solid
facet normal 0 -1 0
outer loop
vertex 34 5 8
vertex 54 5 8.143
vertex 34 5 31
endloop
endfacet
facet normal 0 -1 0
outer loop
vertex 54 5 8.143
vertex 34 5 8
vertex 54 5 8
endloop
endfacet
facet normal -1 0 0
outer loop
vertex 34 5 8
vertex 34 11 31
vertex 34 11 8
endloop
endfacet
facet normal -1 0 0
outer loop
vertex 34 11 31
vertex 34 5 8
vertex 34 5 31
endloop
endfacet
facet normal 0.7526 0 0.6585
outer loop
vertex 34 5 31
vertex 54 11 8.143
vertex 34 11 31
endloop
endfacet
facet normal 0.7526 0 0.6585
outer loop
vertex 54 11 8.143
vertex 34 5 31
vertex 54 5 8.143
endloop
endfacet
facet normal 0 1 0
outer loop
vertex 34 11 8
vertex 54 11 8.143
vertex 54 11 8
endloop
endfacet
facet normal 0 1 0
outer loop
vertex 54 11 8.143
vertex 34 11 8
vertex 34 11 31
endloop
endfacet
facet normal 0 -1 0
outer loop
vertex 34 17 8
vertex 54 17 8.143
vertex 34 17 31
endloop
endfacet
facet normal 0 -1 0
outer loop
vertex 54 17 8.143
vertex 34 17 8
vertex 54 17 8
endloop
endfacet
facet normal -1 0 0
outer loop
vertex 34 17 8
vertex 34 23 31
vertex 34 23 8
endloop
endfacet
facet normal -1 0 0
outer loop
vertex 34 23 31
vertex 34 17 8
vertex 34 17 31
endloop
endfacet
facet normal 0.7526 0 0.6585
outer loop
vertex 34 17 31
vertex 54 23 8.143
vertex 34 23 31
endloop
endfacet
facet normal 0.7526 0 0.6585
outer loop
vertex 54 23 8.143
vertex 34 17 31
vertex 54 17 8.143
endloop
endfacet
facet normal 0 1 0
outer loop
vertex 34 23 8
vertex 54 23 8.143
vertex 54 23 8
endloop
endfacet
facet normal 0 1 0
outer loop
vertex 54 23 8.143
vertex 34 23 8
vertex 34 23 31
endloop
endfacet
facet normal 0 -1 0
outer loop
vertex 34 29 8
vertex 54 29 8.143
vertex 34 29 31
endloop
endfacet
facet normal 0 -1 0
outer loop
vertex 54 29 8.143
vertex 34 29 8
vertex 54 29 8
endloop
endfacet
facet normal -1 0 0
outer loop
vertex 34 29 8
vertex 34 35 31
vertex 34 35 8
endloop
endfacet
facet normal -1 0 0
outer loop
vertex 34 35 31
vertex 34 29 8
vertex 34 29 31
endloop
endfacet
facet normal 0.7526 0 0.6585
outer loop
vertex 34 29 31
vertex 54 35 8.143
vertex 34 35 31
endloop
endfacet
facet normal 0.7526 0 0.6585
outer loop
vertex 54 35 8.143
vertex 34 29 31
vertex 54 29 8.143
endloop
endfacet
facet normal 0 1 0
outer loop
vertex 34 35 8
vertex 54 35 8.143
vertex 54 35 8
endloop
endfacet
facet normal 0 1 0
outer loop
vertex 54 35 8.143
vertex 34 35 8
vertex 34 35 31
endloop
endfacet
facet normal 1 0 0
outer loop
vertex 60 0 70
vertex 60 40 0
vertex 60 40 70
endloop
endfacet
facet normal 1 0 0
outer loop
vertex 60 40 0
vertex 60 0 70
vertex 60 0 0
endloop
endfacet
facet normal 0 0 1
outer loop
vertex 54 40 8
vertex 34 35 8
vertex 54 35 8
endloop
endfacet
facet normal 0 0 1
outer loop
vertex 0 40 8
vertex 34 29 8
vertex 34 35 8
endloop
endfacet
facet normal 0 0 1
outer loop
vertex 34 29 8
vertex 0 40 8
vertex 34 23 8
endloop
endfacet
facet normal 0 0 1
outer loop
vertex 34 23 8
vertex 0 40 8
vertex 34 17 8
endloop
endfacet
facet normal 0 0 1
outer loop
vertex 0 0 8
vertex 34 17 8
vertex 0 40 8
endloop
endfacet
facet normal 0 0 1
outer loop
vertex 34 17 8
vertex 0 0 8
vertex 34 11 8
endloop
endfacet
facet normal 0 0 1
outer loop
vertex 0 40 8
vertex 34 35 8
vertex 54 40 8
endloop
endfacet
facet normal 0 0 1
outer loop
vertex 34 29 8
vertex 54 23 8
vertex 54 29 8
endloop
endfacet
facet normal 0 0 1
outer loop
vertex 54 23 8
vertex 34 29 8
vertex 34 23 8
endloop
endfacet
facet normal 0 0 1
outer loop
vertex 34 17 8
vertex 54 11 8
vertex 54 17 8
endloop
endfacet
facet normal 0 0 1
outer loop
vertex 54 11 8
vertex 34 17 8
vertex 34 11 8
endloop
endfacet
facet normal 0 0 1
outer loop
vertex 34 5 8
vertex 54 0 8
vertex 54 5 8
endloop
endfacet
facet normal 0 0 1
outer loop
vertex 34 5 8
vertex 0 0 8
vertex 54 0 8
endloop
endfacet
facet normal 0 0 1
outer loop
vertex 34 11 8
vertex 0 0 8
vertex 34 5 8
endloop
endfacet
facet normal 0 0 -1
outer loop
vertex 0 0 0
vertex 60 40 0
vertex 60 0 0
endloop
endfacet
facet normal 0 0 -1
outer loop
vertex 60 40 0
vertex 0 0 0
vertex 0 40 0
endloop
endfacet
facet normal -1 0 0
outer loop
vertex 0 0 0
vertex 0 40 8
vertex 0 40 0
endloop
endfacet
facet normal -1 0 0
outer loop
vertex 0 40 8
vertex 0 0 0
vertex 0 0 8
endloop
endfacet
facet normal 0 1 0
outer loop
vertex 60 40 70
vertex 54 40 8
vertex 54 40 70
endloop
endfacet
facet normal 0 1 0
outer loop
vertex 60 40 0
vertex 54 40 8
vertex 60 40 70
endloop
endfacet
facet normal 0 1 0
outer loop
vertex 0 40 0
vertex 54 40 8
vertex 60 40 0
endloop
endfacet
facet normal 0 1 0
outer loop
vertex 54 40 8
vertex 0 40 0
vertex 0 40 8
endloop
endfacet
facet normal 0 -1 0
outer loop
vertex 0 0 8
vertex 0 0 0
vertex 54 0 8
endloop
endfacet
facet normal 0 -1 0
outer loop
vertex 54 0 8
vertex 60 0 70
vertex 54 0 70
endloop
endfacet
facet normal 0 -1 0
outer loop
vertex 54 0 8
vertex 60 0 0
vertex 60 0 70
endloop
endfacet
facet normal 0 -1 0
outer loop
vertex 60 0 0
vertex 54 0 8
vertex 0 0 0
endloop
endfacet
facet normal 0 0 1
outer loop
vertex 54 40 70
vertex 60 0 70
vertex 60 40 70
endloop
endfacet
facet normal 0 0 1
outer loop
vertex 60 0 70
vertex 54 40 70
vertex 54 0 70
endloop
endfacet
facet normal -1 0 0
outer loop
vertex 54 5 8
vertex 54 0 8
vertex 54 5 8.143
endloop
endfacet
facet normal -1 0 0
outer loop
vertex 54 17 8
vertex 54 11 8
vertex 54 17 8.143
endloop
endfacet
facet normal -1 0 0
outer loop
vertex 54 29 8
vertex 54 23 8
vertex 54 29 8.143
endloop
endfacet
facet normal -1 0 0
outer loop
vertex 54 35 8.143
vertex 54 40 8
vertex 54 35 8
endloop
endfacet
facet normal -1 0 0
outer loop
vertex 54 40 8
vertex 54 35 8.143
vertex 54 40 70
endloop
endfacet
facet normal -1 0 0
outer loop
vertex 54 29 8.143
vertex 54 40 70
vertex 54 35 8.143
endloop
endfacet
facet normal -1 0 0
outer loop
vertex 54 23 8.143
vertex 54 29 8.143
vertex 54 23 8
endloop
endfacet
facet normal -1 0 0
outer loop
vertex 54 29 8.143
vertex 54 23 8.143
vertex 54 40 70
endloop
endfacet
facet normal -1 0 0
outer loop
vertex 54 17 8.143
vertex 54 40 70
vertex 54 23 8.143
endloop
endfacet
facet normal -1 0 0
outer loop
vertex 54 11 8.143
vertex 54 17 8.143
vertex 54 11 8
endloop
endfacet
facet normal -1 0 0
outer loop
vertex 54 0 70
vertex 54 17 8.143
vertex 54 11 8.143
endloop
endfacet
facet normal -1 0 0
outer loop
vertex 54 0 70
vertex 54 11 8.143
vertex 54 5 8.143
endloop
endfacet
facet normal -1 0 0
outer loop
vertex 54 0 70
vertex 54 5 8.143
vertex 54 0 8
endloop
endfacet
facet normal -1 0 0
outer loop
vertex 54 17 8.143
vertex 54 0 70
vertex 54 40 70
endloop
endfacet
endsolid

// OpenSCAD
$fn = 32;

// ----------------------------------------------------------------------
// Rib bracket: 3-gusset L bracket
// ----------------------------------------------------------------------

// --- parameters (mm) ---
base_l = 60;              // foot length, X
base_w = 40;              // foot width, Y
base_t = 8;               // foot thickness
plate_t = 6;              // upright plate thickness
plate_h = 70;             // overall height
gus_l = 20;               // gusset leg along the foot
gus_h = 24;               // gusset height
gus_t = 6;                // gusset thickness
gus_edge = 5;             // gusset margin from the foot edge
n_gus = 3;                // gusset count

gus_pitch = (base_w - 2 * gus_edge - gus_t) / (n_gus - 1);  // gusset pitch

union() {
  cube([base_l, base_w, base_t]);
  translate([base_l - plate_t, 0, base_t - 1])
    cube([plate_t, base_w, plate_h - base_t + 1]);
  for (i = [0 : n_gus - 1])
    translate([base_l - plate_t - gus_l, gus_edge + i * gus_pitch, base_t - 1])
      rotate([-90, 0, 0])
        linear_extrude(height = gus_t)
          polygon(points = [[0, 0], [gus_l + 1, 0], [0, -gus_h]]);
}
